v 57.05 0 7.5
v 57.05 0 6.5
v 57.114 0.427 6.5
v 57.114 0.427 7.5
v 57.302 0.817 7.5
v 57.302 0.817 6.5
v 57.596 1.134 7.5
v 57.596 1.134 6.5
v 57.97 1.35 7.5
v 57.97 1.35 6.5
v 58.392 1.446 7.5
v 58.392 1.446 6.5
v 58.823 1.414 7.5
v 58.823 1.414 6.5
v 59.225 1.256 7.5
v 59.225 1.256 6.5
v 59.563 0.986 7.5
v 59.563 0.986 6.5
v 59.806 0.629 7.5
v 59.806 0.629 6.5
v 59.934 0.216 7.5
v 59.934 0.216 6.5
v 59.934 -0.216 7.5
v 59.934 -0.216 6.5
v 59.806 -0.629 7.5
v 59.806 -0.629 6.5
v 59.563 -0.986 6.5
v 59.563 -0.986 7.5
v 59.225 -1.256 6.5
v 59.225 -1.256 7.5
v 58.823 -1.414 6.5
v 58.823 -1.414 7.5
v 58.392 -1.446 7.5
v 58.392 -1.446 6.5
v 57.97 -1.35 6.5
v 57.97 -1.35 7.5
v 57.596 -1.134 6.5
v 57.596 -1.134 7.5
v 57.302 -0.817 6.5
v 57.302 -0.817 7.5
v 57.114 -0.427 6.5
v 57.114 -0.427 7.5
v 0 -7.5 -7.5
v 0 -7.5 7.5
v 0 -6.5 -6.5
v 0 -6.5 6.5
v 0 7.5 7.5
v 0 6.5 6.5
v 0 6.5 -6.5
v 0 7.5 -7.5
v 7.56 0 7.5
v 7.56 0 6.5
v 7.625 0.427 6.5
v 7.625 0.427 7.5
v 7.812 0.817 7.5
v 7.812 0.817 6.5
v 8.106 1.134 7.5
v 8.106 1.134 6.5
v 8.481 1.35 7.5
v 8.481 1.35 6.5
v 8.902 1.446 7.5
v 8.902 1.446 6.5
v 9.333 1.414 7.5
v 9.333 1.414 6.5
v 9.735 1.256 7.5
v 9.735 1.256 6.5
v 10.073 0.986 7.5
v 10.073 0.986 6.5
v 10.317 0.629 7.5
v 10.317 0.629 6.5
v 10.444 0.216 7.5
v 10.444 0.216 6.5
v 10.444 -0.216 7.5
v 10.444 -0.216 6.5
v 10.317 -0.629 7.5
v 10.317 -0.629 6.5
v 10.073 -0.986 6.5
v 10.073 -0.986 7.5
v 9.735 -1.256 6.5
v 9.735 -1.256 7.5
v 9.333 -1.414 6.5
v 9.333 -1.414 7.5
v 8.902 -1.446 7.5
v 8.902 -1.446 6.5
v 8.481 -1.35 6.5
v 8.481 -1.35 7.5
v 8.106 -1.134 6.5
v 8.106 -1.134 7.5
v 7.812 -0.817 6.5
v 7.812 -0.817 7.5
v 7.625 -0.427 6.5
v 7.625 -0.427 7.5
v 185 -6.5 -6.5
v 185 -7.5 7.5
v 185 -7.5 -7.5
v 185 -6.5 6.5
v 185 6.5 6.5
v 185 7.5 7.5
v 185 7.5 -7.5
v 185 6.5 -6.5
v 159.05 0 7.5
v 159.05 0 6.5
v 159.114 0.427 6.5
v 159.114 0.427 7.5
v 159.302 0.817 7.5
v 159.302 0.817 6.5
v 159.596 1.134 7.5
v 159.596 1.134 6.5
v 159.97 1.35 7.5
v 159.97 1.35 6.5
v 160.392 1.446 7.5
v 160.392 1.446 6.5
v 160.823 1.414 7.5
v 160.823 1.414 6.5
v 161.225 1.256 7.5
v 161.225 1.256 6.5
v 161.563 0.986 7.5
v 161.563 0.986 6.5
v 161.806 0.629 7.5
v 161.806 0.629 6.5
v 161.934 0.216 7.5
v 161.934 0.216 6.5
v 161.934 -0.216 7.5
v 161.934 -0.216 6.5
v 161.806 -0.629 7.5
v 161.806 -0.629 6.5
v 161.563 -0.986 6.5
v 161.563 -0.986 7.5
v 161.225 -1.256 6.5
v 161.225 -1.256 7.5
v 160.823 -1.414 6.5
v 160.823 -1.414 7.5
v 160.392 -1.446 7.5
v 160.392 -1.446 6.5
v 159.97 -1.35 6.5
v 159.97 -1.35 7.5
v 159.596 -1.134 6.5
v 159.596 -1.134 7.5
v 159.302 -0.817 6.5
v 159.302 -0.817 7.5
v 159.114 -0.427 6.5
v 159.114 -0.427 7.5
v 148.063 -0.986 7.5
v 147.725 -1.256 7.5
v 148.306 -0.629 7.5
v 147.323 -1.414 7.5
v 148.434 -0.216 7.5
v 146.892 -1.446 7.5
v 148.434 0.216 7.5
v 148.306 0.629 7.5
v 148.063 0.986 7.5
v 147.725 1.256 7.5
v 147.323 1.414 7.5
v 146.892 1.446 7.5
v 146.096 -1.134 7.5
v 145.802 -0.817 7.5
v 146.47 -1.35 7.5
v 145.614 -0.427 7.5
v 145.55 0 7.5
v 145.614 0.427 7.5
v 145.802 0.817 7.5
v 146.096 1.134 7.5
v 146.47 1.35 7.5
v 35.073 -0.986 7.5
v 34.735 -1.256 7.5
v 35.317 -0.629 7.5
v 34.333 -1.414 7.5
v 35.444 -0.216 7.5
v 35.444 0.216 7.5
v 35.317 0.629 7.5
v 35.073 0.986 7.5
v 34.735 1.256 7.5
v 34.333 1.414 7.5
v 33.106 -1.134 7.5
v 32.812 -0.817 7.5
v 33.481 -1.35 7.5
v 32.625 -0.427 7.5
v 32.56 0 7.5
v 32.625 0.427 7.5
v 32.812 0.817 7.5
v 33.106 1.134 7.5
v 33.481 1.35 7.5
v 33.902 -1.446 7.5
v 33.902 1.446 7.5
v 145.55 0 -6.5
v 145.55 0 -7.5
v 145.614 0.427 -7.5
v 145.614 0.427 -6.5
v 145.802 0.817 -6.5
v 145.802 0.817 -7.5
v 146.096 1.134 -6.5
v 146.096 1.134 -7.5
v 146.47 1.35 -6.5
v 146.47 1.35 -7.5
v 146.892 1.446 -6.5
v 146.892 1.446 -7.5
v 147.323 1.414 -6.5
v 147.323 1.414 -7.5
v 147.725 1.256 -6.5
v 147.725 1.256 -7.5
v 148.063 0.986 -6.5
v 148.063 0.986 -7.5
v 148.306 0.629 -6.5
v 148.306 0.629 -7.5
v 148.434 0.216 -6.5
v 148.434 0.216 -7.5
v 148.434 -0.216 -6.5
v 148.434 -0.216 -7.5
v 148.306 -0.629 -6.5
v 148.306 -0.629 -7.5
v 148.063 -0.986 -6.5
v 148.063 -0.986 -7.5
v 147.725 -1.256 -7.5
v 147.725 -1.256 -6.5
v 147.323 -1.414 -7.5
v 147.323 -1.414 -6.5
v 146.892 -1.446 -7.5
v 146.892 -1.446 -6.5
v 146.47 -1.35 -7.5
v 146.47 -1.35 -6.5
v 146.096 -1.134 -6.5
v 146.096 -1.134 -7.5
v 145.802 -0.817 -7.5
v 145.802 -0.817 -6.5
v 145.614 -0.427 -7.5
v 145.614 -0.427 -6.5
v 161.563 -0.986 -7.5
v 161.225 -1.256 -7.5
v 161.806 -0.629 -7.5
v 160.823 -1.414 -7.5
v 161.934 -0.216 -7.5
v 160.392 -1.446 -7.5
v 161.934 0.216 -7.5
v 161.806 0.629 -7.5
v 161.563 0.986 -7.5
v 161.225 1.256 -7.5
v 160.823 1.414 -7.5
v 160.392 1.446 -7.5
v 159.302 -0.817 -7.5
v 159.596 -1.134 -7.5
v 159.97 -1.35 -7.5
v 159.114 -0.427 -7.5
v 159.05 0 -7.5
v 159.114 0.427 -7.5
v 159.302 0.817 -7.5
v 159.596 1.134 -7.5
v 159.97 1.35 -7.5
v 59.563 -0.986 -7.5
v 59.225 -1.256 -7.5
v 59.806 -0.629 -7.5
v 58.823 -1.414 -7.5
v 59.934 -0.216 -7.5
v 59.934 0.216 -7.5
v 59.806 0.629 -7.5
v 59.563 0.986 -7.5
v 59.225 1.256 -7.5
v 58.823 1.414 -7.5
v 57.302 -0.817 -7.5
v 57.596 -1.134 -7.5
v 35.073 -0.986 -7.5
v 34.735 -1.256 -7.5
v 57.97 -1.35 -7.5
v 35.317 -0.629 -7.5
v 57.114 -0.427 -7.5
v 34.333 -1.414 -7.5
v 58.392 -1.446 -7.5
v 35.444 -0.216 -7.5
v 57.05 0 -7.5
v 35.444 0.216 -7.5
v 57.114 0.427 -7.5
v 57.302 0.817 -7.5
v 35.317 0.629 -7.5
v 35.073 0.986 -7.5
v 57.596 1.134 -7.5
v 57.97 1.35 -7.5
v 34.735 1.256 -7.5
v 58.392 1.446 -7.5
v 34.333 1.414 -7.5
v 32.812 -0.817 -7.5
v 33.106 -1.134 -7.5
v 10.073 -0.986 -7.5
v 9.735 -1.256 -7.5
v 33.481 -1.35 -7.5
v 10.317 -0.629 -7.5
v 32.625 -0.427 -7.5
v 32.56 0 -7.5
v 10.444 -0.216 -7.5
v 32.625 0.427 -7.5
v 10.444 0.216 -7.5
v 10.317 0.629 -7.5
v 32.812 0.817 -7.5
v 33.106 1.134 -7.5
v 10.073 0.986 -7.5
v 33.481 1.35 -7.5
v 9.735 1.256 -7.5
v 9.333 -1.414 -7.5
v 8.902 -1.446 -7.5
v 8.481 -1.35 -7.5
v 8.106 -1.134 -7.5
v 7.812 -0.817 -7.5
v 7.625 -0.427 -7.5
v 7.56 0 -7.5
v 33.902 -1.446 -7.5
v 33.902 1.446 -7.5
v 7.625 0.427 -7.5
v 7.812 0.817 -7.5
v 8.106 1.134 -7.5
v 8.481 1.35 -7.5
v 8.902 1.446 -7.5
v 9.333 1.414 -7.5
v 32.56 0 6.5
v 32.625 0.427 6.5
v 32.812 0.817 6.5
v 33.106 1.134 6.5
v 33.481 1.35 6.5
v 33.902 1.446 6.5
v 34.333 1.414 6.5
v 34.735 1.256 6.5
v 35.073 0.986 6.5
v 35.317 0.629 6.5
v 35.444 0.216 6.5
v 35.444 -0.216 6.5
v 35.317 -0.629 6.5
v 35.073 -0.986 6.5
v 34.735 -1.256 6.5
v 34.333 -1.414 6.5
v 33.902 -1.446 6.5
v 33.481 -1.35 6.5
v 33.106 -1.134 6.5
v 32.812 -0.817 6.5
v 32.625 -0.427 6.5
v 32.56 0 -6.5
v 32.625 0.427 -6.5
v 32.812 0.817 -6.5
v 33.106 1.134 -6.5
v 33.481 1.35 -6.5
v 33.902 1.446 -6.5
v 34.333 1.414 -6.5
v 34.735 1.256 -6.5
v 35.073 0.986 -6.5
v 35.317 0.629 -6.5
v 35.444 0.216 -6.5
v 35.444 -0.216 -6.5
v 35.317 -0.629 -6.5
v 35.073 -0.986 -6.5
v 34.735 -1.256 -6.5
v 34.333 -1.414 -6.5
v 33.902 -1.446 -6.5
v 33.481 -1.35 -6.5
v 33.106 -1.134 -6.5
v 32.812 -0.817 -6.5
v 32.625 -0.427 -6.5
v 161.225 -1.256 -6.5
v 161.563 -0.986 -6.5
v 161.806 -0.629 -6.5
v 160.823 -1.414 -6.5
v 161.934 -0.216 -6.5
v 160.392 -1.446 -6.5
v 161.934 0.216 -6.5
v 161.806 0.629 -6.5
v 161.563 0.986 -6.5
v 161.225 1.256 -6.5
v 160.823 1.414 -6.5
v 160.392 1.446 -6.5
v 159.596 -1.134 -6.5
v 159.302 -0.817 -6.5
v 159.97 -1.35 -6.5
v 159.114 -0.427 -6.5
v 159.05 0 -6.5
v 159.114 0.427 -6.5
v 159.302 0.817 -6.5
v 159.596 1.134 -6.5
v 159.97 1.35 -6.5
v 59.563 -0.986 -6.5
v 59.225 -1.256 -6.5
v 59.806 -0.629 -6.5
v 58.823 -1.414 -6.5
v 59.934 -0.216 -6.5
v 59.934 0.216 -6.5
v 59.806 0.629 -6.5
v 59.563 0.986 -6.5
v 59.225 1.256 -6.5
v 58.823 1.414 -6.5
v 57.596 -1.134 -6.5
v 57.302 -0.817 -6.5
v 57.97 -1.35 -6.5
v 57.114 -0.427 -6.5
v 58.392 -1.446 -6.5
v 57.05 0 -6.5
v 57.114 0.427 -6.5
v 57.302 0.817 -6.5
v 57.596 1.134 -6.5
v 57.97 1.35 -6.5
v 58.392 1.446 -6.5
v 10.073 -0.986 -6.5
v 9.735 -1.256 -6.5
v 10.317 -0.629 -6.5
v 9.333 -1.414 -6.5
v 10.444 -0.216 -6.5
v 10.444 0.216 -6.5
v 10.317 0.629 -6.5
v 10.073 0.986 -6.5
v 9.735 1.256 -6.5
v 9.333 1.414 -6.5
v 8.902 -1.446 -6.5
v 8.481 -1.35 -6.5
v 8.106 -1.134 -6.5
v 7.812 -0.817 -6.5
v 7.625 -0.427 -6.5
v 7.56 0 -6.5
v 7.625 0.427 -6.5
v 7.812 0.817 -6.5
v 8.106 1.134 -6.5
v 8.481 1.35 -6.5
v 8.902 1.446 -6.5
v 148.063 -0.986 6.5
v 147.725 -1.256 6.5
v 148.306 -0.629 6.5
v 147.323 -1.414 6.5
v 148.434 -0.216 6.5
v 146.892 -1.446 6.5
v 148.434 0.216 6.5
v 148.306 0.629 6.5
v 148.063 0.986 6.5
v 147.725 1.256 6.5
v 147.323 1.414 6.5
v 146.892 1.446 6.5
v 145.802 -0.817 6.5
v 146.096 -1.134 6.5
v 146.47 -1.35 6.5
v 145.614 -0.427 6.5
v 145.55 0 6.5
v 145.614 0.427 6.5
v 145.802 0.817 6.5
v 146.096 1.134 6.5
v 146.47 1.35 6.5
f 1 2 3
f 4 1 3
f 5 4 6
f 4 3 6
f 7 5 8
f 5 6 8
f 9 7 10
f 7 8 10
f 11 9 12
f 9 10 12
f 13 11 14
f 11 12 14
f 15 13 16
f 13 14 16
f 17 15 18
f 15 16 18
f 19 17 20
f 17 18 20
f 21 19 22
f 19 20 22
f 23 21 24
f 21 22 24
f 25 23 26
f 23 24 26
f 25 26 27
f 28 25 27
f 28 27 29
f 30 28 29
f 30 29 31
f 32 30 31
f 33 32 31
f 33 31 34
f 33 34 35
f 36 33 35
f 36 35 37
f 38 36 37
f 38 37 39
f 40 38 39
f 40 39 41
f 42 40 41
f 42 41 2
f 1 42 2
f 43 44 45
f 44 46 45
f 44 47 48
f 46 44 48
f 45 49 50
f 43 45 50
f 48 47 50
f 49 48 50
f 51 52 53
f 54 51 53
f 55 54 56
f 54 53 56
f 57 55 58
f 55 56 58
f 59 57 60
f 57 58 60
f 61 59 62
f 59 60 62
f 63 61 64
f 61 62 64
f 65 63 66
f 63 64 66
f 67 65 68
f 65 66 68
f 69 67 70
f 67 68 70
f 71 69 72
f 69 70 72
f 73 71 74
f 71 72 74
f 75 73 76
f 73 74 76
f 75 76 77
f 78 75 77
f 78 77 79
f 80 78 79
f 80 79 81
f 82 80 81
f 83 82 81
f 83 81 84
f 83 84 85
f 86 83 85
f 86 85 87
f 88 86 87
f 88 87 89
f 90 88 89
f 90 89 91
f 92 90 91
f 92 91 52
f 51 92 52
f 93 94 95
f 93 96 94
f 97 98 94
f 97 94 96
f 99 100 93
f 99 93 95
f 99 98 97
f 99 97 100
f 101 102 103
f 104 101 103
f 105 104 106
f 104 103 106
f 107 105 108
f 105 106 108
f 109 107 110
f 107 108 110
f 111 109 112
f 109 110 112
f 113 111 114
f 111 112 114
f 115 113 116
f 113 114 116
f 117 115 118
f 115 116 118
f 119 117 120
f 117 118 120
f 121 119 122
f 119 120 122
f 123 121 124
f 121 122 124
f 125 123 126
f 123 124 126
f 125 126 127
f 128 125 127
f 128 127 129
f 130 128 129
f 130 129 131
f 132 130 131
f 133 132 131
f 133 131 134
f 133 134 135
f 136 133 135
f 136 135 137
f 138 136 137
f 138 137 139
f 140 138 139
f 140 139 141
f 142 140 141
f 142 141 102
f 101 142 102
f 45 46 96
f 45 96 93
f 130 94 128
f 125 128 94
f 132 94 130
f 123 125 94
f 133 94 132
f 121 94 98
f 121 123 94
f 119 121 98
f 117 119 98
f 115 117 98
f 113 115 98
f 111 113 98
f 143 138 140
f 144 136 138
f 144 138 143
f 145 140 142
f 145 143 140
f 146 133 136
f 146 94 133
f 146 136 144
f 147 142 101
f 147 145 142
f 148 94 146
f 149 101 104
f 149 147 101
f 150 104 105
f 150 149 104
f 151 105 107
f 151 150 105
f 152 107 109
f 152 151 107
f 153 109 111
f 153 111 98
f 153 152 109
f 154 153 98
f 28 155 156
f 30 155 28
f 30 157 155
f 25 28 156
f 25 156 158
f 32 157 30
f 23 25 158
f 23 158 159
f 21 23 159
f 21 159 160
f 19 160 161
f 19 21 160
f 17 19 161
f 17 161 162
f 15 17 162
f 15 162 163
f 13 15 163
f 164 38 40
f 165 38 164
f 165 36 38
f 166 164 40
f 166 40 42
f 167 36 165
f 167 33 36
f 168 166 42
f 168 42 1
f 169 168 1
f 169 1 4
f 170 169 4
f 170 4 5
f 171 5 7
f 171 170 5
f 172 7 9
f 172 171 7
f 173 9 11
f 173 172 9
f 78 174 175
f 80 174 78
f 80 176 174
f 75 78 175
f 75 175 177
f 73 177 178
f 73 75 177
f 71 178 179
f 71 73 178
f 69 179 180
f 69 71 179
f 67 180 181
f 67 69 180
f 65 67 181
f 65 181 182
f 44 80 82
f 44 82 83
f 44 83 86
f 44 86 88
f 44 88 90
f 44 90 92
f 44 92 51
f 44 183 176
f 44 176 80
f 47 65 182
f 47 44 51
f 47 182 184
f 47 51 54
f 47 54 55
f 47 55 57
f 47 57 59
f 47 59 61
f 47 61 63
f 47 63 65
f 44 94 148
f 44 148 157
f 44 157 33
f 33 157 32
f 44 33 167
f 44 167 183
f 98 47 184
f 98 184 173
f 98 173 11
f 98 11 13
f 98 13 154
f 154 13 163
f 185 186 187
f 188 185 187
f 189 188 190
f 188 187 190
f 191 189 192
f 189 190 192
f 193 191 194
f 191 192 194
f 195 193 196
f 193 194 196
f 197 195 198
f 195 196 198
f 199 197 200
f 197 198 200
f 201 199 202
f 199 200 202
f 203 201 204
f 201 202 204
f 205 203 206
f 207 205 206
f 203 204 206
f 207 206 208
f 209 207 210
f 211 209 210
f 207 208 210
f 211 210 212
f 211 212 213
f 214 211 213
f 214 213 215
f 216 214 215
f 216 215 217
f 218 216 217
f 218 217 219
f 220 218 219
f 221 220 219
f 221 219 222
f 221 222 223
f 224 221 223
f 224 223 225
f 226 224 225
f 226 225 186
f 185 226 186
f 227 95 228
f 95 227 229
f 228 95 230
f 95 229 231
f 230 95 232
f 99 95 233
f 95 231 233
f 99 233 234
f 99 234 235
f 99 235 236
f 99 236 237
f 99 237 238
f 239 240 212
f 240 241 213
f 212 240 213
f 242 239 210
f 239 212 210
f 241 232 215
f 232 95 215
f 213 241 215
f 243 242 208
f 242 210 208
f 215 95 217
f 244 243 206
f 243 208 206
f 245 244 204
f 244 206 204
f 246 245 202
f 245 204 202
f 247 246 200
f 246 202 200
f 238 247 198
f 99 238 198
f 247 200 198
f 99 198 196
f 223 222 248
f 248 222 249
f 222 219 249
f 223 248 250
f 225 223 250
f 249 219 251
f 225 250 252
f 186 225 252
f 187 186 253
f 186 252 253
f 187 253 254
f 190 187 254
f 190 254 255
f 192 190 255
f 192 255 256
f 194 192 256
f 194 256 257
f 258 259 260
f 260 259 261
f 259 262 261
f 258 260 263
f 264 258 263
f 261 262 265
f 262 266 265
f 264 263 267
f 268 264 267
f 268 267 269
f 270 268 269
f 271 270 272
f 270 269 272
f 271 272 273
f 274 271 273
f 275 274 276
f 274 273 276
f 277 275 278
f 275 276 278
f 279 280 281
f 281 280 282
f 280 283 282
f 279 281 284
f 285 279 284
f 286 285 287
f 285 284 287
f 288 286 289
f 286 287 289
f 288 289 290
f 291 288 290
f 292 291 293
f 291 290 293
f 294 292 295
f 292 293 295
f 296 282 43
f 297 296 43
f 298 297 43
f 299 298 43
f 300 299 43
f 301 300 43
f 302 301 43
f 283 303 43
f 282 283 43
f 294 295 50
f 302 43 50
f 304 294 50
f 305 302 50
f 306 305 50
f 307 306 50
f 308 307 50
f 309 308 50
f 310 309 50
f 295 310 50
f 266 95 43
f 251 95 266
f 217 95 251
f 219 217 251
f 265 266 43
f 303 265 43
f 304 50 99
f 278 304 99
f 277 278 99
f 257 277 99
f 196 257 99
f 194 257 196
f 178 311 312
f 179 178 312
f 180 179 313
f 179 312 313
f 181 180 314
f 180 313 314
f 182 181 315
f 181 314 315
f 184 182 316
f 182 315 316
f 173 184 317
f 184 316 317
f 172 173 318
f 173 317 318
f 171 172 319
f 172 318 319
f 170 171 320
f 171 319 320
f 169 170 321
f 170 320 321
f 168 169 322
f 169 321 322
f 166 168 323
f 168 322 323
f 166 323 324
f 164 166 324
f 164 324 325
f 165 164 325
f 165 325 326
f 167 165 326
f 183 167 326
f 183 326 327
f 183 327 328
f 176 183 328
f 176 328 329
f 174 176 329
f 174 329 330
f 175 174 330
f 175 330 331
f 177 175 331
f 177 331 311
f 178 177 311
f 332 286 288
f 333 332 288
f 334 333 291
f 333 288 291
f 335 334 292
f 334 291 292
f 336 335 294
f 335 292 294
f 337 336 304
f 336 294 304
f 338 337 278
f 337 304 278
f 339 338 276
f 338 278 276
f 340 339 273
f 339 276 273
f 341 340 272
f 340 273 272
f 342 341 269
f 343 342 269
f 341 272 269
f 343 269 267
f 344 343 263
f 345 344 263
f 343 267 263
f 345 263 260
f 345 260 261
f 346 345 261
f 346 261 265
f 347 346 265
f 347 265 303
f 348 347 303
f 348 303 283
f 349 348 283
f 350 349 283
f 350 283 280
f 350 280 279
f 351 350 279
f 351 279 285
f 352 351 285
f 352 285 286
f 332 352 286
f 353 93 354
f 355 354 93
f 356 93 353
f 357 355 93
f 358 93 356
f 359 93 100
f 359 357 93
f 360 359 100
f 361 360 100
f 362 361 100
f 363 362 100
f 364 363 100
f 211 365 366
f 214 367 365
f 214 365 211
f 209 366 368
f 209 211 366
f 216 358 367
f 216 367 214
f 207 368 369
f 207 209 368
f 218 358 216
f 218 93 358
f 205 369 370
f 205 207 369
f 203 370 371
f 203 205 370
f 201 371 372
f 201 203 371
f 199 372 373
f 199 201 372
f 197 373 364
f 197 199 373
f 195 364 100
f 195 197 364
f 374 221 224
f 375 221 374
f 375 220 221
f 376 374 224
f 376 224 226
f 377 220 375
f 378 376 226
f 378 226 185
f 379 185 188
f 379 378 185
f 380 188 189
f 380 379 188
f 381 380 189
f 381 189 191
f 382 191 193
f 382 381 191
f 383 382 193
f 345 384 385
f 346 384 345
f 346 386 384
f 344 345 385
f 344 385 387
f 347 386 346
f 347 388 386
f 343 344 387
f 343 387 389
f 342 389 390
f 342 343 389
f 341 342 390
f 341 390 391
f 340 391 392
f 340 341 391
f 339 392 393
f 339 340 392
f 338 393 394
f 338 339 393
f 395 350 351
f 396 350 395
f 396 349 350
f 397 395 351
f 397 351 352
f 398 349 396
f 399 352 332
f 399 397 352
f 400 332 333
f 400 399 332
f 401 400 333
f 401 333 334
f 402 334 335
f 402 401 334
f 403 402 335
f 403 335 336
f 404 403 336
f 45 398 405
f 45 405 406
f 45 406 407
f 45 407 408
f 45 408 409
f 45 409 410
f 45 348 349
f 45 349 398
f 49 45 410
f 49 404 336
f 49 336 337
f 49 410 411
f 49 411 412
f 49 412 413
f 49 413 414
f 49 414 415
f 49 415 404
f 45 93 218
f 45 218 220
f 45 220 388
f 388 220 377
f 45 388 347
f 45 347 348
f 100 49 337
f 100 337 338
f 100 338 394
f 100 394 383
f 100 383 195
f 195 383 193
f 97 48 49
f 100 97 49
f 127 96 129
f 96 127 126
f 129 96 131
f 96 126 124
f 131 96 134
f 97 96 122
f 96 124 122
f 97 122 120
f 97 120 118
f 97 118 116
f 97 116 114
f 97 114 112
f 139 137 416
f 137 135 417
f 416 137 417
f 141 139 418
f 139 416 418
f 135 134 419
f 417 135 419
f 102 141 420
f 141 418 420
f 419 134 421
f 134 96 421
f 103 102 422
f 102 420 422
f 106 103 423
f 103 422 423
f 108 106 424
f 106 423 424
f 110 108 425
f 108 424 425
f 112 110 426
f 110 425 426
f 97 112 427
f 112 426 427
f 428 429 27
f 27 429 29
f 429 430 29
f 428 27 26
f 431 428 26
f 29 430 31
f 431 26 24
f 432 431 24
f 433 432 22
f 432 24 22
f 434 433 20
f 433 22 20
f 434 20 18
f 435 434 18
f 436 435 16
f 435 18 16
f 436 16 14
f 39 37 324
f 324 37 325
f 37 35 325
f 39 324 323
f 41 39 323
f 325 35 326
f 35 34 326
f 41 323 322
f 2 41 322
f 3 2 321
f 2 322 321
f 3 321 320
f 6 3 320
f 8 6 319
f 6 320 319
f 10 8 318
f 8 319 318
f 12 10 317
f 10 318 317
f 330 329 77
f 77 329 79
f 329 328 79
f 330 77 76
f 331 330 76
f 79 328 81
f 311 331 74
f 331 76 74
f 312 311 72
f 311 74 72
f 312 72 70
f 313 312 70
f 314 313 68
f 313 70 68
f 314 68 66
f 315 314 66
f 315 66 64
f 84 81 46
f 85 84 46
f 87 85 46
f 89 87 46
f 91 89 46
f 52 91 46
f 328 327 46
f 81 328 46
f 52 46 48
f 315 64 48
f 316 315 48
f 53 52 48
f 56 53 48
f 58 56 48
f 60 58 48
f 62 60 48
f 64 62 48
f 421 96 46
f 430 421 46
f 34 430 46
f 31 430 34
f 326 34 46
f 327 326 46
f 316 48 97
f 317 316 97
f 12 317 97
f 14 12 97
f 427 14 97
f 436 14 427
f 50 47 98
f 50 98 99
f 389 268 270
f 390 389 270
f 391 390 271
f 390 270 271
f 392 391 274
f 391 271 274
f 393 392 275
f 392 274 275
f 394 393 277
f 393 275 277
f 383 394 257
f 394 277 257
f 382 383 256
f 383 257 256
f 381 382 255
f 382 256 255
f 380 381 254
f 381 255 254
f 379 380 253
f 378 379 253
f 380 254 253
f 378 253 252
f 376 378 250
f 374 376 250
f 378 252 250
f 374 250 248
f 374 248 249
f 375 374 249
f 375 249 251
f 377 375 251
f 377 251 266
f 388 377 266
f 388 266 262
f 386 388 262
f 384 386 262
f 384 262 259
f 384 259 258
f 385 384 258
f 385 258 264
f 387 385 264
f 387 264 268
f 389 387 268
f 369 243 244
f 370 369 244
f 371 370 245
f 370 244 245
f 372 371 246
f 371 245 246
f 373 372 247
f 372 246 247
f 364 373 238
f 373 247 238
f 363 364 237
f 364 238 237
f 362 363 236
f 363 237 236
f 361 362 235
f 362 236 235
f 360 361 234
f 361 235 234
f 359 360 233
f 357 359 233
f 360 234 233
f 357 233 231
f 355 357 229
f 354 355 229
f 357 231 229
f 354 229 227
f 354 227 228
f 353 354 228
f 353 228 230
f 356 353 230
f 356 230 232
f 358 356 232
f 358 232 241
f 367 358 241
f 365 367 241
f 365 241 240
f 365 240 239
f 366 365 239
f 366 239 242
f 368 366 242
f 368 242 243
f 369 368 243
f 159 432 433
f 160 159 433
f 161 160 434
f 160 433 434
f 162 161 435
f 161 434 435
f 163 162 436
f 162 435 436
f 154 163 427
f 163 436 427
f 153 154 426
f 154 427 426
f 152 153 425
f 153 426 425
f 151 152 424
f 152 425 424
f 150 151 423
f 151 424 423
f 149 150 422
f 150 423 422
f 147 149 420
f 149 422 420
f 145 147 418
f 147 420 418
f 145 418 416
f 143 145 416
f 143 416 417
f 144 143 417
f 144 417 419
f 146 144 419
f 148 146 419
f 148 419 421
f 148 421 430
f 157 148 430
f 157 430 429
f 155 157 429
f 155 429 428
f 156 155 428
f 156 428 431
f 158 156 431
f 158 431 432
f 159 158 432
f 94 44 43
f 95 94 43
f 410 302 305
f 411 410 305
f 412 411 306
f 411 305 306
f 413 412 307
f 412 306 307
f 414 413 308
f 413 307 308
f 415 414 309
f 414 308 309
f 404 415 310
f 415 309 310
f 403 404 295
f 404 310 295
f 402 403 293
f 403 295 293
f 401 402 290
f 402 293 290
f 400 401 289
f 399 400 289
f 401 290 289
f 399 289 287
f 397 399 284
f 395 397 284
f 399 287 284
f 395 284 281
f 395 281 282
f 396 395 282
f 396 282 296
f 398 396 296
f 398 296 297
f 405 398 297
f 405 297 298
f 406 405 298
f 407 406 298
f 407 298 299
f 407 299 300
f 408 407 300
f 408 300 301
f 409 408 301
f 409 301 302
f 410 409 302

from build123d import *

# Parameters (mm, degrees)
SKETCH_1_W          = 15
SKETCH_1_H          = 15
SKETCH_1_W_2        = 13
SKETCH_1_H_2        = 13
EXTRUDE_1_DEPTH     = 185
SKETCH_2_R          = 1.45
CUT_EXTRUDE_1_DEPTH = 186.758579883


with BuildPart() as part:
    # 草图1 → 凸台-拉伸1 (new body)
    with BuildSketch(Plane(origin=(0, 0, 0), x_dir=(0, 0, -1), z_dir=(1, 0, 0))):
        Rectangle(SKETCH_1_W, SKETCH_1_H)
        Rectangle(SKETCH_1_W_2, SKETCH_1_H_2, mode=Mode.SUBTRACT)
    extrude(amount=EXTRUDE_1_DEPTH)

    # 草图2 → 切除-拉伸1 (cut, through all)
    with BuildSketch(Plane(origin=(0, 0, -7.5), x_dir=(-1, 0, 0), z_dir=(0, 0, -1))):
        with Locations((-9.010396093, 0)):
            Circle(SKETCH_2_R)
        with Locations((-160.5, 0)):
            Circle(SKETCH_2_R)
        with Locations((-147, 0)):
            Circle(SKETCH_2_R)
        with Locations((-58.5, 0)):
            Circle(SKETCH_2_R)
        with Locations((-34.010396093, 0)):
            Circle(SKETCH_2_R)
    extrude(amount=-CUT_EXTRUDE_1_DEPTH, mode=Mode.SUBTRACT)


solid = part.part
